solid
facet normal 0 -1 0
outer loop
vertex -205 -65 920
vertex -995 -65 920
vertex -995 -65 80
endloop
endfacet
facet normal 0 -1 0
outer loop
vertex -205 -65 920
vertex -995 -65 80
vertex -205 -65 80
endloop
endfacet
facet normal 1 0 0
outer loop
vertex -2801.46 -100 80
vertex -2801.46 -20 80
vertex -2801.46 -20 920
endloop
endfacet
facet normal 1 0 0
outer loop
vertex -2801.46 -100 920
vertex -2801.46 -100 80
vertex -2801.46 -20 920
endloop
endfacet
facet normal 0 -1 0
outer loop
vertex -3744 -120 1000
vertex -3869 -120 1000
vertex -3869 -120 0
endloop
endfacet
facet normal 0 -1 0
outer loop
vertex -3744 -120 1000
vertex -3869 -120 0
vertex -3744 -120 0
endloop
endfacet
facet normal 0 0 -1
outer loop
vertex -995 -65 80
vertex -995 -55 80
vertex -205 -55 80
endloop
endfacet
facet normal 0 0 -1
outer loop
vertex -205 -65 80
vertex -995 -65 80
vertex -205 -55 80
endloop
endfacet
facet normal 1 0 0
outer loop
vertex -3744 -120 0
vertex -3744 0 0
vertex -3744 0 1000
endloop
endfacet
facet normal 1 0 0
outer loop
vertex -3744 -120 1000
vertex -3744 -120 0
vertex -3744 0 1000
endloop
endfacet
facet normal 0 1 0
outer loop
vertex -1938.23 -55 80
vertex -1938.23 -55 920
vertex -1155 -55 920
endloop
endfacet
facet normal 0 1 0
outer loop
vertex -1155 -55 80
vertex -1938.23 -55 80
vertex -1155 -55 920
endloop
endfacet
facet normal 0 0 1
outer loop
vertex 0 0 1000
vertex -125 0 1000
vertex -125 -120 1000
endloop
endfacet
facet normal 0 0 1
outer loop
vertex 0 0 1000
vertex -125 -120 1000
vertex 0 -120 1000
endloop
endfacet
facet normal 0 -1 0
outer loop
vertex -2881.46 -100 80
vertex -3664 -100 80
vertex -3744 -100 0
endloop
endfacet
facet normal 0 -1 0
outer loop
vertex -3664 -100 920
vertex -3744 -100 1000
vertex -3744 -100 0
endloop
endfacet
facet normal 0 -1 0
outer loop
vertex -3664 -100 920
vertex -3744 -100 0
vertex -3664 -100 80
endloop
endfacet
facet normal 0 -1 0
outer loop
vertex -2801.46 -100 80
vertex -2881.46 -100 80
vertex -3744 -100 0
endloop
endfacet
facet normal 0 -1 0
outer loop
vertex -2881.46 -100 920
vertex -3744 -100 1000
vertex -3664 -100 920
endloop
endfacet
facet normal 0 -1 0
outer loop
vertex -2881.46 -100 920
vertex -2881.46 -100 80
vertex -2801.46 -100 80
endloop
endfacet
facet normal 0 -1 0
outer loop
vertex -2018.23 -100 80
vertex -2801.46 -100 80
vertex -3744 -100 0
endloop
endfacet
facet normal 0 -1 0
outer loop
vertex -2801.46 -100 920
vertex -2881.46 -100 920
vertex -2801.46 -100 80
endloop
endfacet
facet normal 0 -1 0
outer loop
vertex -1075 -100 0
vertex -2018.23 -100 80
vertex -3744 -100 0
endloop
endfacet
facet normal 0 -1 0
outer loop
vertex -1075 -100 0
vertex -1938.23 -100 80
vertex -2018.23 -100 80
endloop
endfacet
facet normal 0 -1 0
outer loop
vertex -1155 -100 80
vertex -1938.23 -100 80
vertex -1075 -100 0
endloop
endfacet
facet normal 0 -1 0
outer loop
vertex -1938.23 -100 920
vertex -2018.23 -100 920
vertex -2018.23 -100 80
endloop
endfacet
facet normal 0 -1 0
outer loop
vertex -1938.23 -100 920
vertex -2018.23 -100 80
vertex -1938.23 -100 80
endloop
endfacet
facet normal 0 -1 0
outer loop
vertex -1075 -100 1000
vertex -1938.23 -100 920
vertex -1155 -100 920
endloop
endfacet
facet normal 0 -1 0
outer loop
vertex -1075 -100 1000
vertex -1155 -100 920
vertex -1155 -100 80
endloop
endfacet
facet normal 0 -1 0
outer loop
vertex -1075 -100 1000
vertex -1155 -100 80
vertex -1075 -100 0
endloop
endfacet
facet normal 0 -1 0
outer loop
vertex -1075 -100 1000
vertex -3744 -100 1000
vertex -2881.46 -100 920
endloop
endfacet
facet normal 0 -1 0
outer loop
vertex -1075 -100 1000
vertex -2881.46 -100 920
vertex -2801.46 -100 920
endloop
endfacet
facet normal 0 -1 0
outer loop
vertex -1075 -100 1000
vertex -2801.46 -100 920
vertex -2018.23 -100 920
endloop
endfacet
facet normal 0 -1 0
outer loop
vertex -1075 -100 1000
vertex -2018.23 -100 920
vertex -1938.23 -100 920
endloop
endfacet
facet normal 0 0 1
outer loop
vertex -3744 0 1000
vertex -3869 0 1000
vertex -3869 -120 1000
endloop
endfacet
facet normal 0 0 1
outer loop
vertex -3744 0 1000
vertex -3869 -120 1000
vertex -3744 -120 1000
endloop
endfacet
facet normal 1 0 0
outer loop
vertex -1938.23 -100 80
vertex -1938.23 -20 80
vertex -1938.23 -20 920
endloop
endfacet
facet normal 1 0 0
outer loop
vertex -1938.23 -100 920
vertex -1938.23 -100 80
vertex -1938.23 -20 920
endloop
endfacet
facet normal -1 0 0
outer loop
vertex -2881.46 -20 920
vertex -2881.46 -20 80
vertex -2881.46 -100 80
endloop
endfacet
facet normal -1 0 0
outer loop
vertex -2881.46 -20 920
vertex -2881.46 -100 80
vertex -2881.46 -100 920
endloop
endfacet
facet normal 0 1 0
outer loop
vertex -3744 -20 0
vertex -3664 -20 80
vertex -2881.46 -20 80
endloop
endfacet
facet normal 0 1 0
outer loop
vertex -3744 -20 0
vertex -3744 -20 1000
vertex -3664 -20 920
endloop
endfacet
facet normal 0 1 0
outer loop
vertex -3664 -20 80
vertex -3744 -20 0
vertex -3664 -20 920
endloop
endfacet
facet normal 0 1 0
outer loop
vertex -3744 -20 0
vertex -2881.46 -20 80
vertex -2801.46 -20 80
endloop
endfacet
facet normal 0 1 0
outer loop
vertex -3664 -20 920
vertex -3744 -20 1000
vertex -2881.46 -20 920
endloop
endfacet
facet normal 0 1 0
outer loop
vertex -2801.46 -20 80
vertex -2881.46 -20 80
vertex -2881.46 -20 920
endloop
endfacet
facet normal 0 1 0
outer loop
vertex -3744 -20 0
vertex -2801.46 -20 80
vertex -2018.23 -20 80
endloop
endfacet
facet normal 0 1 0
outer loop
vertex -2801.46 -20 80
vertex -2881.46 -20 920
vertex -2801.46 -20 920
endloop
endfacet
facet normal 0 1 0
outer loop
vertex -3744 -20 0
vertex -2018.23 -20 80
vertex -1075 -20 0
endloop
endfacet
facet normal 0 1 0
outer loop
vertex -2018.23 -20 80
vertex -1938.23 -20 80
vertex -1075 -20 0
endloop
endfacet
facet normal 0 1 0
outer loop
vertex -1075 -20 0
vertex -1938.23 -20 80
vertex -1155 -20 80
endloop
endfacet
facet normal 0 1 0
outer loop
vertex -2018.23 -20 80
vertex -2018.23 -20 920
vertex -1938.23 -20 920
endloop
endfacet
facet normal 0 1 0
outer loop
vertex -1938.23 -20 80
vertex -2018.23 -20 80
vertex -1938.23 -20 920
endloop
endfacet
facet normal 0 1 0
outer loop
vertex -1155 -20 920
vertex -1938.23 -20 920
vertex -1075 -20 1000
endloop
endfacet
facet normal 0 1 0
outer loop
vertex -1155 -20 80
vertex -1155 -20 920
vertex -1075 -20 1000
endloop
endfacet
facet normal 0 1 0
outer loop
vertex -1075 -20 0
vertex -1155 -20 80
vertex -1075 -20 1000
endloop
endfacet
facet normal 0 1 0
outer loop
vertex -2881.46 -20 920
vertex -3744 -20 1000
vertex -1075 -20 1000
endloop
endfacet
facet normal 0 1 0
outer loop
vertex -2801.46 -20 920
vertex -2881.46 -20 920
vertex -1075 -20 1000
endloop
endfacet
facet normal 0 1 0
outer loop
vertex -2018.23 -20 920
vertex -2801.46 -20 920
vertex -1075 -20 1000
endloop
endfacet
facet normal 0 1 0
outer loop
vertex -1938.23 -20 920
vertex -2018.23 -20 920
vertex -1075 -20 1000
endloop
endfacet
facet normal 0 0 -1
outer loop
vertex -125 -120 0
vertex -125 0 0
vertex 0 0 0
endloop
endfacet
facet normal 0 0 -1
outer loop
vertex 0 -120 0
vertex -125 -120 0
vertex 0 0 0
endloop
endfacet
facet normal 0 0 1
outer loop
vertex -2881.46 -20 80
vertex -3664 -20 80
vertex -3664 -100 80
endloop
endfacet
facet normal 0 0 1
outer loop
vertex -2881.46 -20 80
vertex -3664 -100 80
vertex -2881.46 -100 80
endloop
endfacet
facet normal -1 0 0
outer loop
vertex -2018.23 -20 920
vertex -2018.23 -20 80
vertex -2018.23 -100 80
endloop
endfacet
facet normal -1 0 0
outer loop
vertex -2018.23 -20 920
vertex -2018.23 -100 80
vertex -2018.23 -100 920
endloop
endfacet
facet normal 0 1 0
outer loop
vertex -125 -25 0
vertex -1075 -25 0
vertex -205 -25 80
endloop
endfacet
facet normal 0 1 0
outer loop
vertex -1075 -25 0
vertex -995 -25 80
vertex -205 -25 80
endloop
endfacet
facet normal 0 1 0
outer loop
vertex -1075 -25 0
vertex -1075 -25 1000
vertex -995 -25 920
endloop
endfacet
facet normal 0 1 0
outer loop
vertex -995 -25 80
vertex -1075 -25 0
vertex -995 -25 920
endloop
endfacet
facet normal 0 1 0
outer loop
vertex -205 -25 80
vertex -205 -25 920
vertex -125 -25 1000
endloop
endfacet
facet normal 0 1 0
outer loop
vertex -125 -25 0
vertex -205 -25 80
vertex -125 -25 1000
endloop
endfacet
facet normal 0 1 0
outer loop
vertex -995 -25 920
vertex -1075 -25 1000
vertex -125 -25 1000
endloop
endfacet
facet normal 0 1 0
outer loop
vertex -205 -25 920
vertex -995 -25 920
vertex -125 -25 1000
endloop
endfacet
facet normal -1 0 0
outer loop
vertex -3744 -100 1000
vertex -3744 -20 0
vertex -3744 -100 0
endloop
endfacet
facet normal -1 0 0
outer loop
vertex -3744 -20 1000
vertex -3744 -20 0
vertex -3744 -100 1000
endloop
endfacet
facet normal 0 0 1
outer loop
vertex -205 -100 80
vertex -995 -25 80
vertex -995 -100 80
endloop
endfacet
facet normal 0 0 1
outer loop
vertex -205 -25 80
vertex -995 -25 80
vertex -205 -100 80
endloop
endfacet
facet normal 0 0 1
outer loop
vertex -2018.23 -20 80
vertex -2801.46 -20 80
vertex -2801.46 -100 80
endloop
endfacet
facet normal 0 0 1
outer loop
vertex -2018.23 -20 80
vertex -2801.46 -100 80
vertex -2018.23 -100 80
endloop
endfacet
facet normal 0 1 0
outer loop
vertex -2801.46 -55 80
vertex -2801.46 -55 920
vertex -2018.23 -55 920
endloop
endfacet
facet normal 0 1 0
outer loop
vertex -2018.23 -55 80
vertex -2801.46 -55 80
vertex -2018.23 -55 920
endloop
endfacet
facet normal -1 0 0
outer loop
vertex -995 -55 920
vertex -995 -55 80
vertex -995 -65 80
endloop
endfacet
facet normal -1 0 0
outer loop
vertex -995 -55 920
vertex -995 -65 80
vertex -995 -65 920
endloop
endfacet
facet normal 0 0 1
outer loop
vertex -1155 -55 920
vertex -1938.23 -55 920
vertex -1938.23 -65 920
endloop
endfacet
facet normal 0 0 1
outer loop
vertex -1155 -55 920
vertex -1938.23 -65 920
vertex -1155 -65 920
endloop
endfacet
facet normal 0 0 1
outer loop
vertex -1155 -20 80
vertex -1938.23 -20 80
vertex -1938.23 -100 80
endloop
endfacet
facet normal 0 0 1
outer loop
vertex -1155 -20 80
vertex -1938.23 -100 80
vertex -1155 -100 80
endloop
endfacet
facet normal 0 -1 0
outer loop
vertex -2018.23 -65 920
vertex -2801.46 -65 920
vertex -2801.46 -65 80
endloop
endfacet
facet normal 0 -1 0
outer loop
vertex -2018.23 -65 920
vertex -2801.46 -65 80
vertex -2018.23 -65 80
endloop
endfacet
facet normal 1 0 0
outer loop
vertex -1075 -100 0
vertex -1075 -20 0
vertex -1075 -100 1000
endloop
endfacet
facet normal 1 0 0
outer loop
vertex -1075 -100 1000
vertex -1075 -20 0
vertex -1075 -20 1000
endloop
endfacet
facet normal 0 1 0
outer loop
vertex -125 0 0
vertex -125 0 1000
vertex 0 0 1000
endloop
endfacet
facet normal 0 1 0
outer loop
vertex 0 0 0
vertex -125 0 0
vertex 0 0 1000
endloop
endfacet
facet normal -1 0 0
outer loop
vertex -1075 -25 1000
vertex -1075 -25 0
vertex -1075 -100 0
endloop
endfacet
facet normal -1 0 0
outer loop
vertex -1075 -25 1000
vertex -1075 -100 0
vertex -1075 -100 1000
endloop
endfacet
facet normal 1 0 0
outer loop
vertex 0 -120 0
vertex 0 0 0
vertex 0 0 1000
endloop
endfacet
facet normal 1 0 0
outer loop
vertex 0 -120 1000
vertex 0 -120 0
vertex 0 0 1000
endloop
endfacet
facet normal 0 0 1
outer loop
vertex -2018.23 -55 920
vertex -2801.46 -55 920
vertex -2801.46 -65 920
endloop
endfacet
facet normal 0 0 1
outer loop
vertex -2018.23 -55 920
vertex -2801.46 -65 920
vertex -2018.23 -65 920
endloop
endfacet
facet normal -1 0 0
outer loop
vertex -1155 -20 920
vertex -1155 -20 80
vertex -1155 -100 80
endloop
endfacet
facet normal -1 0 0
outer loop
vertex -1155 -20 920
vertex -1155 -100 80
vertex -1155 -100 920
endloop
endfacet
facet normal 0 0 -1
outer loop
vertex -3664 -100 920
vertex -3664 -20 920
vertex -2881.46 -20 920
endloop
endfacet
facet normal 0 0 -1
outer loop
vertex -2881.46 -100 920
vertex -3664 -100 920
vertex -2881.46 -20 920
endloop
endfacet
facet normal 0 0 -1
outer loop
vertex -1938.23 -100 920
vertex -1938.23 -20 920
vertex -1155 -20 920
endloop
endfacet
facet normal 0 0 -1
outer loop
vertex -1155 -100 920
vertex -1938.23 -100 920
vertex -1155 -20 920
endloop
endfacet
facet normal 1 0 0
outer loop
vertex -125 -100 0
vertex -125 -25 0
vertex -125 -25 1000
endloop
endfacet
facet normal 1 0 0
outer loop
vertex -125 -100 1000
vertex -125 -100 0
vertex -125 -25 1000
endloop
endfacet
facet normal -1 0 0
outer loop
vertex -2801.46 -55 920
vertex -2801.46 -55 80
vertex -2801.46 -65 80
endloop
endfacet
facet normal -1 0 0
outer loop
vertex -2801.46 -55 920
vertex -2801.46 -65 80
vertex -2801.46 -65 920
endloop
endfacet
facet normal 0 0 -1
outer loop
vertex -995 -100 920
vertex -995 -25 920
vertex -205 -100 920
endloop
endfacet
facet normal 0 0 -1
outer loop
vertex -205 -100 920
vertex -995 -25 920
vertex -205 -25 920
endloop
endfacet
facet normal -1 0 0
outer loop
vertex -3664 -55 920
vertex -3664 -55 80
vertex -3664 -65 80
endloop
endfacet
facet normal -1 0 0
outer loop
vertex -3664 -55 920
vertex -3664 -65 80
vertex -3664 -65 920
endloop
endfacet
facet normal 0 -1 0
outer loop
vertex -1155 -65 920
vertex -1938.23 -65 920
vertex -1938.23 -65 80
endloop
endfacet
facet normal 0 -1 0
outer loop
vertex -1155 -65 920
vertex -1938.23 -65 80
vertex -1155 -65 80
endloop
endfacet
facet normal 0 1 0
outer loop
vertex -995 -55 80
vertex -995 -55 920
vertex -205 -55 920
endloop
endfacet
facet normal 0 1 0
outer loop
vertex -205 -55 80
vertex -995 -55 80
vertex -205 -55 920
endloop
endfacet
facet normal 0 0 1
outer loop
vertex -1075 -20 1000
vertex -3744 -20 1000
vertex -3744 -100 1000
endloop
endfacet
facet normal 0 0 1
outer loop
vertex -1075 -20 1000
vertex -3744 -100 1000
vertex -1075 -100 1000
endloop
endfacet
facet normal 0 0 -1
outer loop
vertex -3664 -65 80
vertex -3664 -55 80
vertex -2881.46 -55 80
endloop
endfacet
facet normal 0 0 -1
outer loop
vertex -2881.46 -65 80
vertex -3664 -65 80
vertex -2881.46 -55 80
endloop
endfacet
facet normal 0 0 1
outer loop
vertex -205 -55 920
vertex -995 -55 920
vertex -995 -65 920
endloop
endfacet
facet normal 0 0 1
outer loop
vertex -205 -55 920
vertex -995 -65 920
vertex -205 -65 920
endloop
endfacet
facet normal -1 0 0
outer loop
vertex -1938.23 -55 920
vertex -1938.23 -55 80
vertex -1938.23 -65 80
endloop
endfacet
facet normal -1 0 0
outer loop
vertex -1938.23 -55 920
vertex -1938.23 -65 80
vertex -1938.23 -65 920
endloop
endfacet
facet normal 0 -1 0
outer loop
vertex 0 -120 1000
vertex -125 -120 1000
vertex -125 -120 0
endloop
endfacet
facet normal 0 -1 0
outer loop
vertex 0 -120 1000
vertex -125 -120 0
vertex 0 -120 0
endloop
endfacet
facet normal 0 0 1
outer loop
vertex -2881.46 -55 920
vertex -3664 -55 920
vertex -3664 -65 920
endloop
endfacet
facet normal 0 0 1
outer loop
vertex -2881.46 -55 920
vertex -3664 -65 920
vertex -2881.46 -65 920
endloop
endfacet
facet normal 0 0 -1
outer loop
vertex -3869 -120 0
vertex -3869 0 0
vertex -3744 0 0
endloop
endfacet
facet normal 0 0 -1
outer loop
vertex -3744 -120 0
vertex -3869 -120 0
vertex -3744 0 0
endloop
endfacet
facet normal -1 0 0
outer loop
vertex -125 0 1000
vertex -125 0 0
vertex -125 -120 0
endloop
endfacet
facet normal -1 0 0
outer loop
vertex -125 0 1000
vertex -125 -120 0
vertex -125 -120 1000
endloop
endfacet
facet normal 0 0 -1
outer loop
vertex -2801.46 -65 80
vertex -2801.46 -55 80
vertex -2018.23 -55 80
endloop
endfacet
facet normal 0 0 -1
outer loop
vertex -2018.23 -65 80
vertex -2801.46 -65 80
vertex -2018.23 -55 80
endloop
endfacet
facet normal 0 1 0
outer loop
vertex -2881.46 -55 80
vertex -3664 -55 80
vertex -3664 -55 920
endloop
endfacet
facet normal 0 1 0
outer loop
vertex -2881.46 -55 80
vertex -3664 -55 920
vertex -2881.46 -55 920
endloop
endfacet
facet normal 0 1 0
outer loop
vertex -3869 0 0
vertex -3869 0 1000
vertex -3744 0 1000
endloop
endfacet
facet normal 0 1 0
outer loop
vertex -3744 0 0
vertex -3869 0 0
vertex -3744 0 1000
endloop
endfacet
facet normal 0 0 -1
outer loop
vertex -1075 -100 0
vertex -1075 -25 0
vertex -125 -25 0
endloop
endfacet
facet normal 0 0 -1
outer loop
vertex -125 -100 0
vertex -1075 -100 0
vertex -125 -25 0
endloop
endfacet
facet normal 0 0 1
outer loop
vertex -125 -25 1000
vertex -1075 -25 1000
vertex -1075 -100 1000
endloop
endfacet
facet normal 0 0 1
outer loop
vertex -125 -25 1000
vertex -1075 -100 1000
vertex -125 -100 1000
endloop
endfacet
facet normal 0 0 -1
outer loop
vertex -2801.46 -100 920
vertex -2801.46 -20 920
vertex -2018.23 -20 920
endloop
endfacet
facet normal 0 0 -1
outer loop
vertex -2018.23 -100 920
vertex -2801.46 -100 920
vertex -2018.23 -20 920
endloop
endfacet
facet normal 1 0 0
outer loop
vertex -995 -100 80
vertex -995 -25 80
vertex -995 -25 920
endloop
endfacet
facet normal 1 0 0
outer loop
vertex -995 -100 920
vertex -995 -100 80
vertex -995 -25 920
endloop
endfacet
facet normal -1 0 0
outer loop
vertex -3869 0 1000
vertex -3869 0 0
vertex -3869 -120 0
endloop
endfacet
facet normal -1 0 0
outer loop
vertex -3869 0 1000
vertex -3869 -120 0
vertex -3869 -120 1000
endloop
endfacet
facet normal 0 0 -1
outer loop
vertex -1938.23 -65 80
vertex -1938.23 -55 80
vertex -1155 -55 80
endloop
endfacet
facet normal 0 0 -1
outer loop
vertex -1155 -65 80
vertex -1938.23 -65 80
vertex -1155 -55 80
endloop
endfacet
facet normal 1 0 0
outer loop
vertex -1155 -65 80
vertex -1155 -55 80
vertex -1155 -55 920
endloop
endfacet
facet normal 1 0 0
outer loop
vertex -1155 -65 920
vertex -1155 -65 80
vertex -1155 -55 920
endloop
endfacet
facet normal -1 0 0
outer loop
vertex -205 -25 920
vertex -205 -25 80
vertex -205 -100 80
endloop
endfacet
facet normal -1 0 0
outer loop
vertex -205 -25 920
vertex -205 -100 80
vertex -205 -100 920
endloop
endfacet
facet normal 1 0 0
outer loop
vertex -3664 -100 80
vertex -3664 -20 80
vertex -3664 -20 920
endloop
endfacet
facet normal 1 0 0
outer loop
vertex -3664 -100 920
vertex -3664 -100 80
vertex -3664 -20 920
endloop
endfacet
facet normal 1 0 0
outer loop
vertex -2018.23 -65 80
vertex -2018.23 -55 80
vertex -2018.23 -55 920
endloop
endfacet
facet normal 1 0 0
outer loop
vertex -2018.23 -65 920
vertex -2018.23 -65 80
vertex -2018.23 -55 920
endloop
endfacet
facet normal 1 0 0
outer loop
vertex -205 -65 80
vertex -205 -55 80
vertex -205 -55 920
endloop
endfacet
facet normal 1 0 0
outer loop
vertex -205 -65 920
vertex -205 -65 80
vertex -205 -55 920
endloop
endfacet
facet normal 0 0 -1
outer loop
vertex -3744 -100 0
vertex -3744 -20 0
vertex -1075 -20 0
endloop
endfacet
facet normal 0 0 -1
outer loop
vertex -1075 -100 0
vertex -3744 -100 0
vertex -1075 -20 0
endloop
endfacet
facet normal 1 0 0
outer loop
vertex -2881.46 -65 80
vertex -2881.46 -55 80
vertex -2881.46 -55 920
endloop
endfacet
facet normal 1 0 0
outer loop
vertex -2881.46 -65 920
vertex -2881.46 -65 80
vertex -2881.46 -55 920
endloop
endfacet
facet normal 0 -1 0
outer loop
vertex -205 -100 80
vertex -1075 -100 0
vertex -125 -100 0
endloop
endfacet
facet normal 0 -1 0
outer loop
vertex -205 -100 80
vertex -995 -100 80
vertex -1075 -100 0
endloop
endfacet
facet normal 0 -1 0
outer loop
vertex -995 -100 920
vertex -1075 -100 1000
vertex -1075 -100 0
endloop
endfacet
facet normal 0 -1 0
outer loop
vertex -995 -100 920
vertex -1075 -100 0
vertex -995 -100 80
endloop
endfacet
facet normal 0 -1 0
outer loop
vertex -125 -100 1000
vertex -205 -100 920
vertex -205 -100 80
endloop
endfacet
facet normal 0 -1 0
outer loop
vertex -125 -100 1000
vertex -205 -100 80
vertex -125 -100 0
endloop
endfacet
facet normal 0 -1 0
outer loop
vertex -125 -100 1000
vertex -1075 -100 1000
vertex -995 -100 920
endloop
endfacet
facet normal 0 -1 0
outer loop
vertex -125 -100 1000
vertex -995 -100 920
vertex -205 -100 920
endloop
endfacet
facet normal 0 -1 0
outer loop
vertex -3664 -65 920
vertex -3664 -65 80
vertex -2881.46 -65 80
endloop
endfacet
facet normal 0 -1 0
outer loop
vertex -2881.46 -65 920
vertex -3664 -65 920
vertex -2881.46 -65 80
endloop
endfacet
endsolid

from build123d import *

# Parameters (mm, degrees)
F0_W     = 125
F0_H     = 1000
F1_DEPTH = 120
F0_W_2   = 2669
F0_W_3   = 782.54
F0_H_2   = 840
F0_W_4   = 783.23
F2_DEPTH = 100
F3_DEPTH = 65
F0_W_5   = 950
F0_W_6   = 790
F4_DEPTH = 100
F5_DEPTH = 65
F6_DEPTH = 25
F7_DEPTH = 55
F8_DEPTH = 20
F9_DEPTH = 55


with BuildPart() as f1:
    # F0 (on Front) → F1 (new body)
    with BuildSketch(Plane.XZ):
        with Locations((-3806.5, 500)):
            Rectangle(F0_W, F0_H)
        with Locations((-62.5, 500)):
            Rectangle(F0_W, F0_H)
    extrude(amount=F1_DEPTH)


with BuildPart() as f2:
    # F0 (on Front) → F2 (new body)
    with BuildSketch(Plane.XZ):
        with Locations((-2409.5, 500)):
            Rectangle(F0_W_2, F0_H)
        with Locations((-3272.73, 500)):
            Rectangle(F0_W_3, F0_H_2, mode=Mode.SUBTRACT)
        with Locations((-2409.845, 500)):
            Rectangle(F0_W_4, F0_H_2, mode=Mode.SUBTRACT)
        with Locations((-1546.615, 500)):
            Rectangle(F0_W_4, F0_H_2, mode=Mode.SUBTRACT)
    extrude(amount=F2_DEPTH)

    # F0 (on Front) → F8 (cut)
    with BuildSketch(Plane.XZ):
        with Locations((-2409.5, 500)):
            Rectangle(F0_W_2, F0_H)
        with Locations((-3272.73, 500)):
            Rectangle(F0_W_3, F0_H_2, mode=Mode.SUBTRACT)
        with Locations((-2409.845, 500)):
            Rectangle(F0_W_4, F0_H_2, mode=Mode.SUBTRACT)
        with Locations((-1546.615, 500)):
            Rectangle(F0_W_4, F0_H_2, mode=Mode.SUBTRACT)
    extrude(amount=F8_DEPTH, mode=Mode.SUBTRACT)


with BuildPart() as f3:
    # F0 (on Front) → F3 (new body)
    with BuildSketch(Plane.XZ):
        with Locations((-3272.73, 500)):
            Rectangle(F0_W_3, F0_H_2)
        with Locations((-2409.845, 500)):
            Rectangle(F0_W_4, F0_H_2)
        with Locations((-1546.615, 500)):
            Rectangle(F0_W_4, F0_H_2)
    extrude(amount=F3_DEPTH)

    # F0 (on Front) → F9 (cut)
    with BuildSketch(Plane.XZ):
        with Locations((-1546.615, 500)):
            Rectangle(F0_W_4, F0_H_2)
        with Locations((-2409.845, 500)):
            Rectangle(F0_W_4, F0_H_2)
        with Locations((-3272.73, 500)):
            Rectangle(F0_W_3, F0_H_2)
    extrude(amount=F9_DEPTH, mode=Mode.SUBTRACT)


with BuildPart() as f4:
    # F0 (on Front) → F4 (new body)
    with BuildSketch(Plane.XZ):
        with Locations((-600, 500)):
            Rectangle(F0_W_5, F0_H)
        with Locations((-600, 500)):
            Rectangle(F0_W_6, F0_H_2, mode=Mode.SUBTRACT)
    extrude(amount=F4_DEPTH)

    # F0 (on Front) → F6 (cut)
    with BuildSketch(Plane.XZ):
        with Locations((-600, 500)):
            Rectangle(F0_W_5, F0_H)
        with Locations((-600, 500)):
            Rectangle(F0_W_6, F0_H_2, mode=Mode.SUBTRACT)
    extrude(amount=F6_DEPTH, mode=Mode.SUBTRACT)


with BuildPart() as f5:
    # F0 (on Front) → F5 (new body)
    with BuildSketch(Plane.XZ):
        with Locations((-600, 500)):
            Rectangle(F0_W_6, F0_H_2)
    extrude(amount=F5_DEPTH)

    # F0 (on Front) → F7 (cut)
    with BuildSketch(Plane.XZ):
        with Locations((-600, 500)):
            Rectangle(F0_W_6, F0_H_2)
    extrude(amount=F7_DEPTH, mode=Mode.SUBTRACT)


solid = Compound([f1.part, f2.part, f3.part, f4.part, f5.part])
